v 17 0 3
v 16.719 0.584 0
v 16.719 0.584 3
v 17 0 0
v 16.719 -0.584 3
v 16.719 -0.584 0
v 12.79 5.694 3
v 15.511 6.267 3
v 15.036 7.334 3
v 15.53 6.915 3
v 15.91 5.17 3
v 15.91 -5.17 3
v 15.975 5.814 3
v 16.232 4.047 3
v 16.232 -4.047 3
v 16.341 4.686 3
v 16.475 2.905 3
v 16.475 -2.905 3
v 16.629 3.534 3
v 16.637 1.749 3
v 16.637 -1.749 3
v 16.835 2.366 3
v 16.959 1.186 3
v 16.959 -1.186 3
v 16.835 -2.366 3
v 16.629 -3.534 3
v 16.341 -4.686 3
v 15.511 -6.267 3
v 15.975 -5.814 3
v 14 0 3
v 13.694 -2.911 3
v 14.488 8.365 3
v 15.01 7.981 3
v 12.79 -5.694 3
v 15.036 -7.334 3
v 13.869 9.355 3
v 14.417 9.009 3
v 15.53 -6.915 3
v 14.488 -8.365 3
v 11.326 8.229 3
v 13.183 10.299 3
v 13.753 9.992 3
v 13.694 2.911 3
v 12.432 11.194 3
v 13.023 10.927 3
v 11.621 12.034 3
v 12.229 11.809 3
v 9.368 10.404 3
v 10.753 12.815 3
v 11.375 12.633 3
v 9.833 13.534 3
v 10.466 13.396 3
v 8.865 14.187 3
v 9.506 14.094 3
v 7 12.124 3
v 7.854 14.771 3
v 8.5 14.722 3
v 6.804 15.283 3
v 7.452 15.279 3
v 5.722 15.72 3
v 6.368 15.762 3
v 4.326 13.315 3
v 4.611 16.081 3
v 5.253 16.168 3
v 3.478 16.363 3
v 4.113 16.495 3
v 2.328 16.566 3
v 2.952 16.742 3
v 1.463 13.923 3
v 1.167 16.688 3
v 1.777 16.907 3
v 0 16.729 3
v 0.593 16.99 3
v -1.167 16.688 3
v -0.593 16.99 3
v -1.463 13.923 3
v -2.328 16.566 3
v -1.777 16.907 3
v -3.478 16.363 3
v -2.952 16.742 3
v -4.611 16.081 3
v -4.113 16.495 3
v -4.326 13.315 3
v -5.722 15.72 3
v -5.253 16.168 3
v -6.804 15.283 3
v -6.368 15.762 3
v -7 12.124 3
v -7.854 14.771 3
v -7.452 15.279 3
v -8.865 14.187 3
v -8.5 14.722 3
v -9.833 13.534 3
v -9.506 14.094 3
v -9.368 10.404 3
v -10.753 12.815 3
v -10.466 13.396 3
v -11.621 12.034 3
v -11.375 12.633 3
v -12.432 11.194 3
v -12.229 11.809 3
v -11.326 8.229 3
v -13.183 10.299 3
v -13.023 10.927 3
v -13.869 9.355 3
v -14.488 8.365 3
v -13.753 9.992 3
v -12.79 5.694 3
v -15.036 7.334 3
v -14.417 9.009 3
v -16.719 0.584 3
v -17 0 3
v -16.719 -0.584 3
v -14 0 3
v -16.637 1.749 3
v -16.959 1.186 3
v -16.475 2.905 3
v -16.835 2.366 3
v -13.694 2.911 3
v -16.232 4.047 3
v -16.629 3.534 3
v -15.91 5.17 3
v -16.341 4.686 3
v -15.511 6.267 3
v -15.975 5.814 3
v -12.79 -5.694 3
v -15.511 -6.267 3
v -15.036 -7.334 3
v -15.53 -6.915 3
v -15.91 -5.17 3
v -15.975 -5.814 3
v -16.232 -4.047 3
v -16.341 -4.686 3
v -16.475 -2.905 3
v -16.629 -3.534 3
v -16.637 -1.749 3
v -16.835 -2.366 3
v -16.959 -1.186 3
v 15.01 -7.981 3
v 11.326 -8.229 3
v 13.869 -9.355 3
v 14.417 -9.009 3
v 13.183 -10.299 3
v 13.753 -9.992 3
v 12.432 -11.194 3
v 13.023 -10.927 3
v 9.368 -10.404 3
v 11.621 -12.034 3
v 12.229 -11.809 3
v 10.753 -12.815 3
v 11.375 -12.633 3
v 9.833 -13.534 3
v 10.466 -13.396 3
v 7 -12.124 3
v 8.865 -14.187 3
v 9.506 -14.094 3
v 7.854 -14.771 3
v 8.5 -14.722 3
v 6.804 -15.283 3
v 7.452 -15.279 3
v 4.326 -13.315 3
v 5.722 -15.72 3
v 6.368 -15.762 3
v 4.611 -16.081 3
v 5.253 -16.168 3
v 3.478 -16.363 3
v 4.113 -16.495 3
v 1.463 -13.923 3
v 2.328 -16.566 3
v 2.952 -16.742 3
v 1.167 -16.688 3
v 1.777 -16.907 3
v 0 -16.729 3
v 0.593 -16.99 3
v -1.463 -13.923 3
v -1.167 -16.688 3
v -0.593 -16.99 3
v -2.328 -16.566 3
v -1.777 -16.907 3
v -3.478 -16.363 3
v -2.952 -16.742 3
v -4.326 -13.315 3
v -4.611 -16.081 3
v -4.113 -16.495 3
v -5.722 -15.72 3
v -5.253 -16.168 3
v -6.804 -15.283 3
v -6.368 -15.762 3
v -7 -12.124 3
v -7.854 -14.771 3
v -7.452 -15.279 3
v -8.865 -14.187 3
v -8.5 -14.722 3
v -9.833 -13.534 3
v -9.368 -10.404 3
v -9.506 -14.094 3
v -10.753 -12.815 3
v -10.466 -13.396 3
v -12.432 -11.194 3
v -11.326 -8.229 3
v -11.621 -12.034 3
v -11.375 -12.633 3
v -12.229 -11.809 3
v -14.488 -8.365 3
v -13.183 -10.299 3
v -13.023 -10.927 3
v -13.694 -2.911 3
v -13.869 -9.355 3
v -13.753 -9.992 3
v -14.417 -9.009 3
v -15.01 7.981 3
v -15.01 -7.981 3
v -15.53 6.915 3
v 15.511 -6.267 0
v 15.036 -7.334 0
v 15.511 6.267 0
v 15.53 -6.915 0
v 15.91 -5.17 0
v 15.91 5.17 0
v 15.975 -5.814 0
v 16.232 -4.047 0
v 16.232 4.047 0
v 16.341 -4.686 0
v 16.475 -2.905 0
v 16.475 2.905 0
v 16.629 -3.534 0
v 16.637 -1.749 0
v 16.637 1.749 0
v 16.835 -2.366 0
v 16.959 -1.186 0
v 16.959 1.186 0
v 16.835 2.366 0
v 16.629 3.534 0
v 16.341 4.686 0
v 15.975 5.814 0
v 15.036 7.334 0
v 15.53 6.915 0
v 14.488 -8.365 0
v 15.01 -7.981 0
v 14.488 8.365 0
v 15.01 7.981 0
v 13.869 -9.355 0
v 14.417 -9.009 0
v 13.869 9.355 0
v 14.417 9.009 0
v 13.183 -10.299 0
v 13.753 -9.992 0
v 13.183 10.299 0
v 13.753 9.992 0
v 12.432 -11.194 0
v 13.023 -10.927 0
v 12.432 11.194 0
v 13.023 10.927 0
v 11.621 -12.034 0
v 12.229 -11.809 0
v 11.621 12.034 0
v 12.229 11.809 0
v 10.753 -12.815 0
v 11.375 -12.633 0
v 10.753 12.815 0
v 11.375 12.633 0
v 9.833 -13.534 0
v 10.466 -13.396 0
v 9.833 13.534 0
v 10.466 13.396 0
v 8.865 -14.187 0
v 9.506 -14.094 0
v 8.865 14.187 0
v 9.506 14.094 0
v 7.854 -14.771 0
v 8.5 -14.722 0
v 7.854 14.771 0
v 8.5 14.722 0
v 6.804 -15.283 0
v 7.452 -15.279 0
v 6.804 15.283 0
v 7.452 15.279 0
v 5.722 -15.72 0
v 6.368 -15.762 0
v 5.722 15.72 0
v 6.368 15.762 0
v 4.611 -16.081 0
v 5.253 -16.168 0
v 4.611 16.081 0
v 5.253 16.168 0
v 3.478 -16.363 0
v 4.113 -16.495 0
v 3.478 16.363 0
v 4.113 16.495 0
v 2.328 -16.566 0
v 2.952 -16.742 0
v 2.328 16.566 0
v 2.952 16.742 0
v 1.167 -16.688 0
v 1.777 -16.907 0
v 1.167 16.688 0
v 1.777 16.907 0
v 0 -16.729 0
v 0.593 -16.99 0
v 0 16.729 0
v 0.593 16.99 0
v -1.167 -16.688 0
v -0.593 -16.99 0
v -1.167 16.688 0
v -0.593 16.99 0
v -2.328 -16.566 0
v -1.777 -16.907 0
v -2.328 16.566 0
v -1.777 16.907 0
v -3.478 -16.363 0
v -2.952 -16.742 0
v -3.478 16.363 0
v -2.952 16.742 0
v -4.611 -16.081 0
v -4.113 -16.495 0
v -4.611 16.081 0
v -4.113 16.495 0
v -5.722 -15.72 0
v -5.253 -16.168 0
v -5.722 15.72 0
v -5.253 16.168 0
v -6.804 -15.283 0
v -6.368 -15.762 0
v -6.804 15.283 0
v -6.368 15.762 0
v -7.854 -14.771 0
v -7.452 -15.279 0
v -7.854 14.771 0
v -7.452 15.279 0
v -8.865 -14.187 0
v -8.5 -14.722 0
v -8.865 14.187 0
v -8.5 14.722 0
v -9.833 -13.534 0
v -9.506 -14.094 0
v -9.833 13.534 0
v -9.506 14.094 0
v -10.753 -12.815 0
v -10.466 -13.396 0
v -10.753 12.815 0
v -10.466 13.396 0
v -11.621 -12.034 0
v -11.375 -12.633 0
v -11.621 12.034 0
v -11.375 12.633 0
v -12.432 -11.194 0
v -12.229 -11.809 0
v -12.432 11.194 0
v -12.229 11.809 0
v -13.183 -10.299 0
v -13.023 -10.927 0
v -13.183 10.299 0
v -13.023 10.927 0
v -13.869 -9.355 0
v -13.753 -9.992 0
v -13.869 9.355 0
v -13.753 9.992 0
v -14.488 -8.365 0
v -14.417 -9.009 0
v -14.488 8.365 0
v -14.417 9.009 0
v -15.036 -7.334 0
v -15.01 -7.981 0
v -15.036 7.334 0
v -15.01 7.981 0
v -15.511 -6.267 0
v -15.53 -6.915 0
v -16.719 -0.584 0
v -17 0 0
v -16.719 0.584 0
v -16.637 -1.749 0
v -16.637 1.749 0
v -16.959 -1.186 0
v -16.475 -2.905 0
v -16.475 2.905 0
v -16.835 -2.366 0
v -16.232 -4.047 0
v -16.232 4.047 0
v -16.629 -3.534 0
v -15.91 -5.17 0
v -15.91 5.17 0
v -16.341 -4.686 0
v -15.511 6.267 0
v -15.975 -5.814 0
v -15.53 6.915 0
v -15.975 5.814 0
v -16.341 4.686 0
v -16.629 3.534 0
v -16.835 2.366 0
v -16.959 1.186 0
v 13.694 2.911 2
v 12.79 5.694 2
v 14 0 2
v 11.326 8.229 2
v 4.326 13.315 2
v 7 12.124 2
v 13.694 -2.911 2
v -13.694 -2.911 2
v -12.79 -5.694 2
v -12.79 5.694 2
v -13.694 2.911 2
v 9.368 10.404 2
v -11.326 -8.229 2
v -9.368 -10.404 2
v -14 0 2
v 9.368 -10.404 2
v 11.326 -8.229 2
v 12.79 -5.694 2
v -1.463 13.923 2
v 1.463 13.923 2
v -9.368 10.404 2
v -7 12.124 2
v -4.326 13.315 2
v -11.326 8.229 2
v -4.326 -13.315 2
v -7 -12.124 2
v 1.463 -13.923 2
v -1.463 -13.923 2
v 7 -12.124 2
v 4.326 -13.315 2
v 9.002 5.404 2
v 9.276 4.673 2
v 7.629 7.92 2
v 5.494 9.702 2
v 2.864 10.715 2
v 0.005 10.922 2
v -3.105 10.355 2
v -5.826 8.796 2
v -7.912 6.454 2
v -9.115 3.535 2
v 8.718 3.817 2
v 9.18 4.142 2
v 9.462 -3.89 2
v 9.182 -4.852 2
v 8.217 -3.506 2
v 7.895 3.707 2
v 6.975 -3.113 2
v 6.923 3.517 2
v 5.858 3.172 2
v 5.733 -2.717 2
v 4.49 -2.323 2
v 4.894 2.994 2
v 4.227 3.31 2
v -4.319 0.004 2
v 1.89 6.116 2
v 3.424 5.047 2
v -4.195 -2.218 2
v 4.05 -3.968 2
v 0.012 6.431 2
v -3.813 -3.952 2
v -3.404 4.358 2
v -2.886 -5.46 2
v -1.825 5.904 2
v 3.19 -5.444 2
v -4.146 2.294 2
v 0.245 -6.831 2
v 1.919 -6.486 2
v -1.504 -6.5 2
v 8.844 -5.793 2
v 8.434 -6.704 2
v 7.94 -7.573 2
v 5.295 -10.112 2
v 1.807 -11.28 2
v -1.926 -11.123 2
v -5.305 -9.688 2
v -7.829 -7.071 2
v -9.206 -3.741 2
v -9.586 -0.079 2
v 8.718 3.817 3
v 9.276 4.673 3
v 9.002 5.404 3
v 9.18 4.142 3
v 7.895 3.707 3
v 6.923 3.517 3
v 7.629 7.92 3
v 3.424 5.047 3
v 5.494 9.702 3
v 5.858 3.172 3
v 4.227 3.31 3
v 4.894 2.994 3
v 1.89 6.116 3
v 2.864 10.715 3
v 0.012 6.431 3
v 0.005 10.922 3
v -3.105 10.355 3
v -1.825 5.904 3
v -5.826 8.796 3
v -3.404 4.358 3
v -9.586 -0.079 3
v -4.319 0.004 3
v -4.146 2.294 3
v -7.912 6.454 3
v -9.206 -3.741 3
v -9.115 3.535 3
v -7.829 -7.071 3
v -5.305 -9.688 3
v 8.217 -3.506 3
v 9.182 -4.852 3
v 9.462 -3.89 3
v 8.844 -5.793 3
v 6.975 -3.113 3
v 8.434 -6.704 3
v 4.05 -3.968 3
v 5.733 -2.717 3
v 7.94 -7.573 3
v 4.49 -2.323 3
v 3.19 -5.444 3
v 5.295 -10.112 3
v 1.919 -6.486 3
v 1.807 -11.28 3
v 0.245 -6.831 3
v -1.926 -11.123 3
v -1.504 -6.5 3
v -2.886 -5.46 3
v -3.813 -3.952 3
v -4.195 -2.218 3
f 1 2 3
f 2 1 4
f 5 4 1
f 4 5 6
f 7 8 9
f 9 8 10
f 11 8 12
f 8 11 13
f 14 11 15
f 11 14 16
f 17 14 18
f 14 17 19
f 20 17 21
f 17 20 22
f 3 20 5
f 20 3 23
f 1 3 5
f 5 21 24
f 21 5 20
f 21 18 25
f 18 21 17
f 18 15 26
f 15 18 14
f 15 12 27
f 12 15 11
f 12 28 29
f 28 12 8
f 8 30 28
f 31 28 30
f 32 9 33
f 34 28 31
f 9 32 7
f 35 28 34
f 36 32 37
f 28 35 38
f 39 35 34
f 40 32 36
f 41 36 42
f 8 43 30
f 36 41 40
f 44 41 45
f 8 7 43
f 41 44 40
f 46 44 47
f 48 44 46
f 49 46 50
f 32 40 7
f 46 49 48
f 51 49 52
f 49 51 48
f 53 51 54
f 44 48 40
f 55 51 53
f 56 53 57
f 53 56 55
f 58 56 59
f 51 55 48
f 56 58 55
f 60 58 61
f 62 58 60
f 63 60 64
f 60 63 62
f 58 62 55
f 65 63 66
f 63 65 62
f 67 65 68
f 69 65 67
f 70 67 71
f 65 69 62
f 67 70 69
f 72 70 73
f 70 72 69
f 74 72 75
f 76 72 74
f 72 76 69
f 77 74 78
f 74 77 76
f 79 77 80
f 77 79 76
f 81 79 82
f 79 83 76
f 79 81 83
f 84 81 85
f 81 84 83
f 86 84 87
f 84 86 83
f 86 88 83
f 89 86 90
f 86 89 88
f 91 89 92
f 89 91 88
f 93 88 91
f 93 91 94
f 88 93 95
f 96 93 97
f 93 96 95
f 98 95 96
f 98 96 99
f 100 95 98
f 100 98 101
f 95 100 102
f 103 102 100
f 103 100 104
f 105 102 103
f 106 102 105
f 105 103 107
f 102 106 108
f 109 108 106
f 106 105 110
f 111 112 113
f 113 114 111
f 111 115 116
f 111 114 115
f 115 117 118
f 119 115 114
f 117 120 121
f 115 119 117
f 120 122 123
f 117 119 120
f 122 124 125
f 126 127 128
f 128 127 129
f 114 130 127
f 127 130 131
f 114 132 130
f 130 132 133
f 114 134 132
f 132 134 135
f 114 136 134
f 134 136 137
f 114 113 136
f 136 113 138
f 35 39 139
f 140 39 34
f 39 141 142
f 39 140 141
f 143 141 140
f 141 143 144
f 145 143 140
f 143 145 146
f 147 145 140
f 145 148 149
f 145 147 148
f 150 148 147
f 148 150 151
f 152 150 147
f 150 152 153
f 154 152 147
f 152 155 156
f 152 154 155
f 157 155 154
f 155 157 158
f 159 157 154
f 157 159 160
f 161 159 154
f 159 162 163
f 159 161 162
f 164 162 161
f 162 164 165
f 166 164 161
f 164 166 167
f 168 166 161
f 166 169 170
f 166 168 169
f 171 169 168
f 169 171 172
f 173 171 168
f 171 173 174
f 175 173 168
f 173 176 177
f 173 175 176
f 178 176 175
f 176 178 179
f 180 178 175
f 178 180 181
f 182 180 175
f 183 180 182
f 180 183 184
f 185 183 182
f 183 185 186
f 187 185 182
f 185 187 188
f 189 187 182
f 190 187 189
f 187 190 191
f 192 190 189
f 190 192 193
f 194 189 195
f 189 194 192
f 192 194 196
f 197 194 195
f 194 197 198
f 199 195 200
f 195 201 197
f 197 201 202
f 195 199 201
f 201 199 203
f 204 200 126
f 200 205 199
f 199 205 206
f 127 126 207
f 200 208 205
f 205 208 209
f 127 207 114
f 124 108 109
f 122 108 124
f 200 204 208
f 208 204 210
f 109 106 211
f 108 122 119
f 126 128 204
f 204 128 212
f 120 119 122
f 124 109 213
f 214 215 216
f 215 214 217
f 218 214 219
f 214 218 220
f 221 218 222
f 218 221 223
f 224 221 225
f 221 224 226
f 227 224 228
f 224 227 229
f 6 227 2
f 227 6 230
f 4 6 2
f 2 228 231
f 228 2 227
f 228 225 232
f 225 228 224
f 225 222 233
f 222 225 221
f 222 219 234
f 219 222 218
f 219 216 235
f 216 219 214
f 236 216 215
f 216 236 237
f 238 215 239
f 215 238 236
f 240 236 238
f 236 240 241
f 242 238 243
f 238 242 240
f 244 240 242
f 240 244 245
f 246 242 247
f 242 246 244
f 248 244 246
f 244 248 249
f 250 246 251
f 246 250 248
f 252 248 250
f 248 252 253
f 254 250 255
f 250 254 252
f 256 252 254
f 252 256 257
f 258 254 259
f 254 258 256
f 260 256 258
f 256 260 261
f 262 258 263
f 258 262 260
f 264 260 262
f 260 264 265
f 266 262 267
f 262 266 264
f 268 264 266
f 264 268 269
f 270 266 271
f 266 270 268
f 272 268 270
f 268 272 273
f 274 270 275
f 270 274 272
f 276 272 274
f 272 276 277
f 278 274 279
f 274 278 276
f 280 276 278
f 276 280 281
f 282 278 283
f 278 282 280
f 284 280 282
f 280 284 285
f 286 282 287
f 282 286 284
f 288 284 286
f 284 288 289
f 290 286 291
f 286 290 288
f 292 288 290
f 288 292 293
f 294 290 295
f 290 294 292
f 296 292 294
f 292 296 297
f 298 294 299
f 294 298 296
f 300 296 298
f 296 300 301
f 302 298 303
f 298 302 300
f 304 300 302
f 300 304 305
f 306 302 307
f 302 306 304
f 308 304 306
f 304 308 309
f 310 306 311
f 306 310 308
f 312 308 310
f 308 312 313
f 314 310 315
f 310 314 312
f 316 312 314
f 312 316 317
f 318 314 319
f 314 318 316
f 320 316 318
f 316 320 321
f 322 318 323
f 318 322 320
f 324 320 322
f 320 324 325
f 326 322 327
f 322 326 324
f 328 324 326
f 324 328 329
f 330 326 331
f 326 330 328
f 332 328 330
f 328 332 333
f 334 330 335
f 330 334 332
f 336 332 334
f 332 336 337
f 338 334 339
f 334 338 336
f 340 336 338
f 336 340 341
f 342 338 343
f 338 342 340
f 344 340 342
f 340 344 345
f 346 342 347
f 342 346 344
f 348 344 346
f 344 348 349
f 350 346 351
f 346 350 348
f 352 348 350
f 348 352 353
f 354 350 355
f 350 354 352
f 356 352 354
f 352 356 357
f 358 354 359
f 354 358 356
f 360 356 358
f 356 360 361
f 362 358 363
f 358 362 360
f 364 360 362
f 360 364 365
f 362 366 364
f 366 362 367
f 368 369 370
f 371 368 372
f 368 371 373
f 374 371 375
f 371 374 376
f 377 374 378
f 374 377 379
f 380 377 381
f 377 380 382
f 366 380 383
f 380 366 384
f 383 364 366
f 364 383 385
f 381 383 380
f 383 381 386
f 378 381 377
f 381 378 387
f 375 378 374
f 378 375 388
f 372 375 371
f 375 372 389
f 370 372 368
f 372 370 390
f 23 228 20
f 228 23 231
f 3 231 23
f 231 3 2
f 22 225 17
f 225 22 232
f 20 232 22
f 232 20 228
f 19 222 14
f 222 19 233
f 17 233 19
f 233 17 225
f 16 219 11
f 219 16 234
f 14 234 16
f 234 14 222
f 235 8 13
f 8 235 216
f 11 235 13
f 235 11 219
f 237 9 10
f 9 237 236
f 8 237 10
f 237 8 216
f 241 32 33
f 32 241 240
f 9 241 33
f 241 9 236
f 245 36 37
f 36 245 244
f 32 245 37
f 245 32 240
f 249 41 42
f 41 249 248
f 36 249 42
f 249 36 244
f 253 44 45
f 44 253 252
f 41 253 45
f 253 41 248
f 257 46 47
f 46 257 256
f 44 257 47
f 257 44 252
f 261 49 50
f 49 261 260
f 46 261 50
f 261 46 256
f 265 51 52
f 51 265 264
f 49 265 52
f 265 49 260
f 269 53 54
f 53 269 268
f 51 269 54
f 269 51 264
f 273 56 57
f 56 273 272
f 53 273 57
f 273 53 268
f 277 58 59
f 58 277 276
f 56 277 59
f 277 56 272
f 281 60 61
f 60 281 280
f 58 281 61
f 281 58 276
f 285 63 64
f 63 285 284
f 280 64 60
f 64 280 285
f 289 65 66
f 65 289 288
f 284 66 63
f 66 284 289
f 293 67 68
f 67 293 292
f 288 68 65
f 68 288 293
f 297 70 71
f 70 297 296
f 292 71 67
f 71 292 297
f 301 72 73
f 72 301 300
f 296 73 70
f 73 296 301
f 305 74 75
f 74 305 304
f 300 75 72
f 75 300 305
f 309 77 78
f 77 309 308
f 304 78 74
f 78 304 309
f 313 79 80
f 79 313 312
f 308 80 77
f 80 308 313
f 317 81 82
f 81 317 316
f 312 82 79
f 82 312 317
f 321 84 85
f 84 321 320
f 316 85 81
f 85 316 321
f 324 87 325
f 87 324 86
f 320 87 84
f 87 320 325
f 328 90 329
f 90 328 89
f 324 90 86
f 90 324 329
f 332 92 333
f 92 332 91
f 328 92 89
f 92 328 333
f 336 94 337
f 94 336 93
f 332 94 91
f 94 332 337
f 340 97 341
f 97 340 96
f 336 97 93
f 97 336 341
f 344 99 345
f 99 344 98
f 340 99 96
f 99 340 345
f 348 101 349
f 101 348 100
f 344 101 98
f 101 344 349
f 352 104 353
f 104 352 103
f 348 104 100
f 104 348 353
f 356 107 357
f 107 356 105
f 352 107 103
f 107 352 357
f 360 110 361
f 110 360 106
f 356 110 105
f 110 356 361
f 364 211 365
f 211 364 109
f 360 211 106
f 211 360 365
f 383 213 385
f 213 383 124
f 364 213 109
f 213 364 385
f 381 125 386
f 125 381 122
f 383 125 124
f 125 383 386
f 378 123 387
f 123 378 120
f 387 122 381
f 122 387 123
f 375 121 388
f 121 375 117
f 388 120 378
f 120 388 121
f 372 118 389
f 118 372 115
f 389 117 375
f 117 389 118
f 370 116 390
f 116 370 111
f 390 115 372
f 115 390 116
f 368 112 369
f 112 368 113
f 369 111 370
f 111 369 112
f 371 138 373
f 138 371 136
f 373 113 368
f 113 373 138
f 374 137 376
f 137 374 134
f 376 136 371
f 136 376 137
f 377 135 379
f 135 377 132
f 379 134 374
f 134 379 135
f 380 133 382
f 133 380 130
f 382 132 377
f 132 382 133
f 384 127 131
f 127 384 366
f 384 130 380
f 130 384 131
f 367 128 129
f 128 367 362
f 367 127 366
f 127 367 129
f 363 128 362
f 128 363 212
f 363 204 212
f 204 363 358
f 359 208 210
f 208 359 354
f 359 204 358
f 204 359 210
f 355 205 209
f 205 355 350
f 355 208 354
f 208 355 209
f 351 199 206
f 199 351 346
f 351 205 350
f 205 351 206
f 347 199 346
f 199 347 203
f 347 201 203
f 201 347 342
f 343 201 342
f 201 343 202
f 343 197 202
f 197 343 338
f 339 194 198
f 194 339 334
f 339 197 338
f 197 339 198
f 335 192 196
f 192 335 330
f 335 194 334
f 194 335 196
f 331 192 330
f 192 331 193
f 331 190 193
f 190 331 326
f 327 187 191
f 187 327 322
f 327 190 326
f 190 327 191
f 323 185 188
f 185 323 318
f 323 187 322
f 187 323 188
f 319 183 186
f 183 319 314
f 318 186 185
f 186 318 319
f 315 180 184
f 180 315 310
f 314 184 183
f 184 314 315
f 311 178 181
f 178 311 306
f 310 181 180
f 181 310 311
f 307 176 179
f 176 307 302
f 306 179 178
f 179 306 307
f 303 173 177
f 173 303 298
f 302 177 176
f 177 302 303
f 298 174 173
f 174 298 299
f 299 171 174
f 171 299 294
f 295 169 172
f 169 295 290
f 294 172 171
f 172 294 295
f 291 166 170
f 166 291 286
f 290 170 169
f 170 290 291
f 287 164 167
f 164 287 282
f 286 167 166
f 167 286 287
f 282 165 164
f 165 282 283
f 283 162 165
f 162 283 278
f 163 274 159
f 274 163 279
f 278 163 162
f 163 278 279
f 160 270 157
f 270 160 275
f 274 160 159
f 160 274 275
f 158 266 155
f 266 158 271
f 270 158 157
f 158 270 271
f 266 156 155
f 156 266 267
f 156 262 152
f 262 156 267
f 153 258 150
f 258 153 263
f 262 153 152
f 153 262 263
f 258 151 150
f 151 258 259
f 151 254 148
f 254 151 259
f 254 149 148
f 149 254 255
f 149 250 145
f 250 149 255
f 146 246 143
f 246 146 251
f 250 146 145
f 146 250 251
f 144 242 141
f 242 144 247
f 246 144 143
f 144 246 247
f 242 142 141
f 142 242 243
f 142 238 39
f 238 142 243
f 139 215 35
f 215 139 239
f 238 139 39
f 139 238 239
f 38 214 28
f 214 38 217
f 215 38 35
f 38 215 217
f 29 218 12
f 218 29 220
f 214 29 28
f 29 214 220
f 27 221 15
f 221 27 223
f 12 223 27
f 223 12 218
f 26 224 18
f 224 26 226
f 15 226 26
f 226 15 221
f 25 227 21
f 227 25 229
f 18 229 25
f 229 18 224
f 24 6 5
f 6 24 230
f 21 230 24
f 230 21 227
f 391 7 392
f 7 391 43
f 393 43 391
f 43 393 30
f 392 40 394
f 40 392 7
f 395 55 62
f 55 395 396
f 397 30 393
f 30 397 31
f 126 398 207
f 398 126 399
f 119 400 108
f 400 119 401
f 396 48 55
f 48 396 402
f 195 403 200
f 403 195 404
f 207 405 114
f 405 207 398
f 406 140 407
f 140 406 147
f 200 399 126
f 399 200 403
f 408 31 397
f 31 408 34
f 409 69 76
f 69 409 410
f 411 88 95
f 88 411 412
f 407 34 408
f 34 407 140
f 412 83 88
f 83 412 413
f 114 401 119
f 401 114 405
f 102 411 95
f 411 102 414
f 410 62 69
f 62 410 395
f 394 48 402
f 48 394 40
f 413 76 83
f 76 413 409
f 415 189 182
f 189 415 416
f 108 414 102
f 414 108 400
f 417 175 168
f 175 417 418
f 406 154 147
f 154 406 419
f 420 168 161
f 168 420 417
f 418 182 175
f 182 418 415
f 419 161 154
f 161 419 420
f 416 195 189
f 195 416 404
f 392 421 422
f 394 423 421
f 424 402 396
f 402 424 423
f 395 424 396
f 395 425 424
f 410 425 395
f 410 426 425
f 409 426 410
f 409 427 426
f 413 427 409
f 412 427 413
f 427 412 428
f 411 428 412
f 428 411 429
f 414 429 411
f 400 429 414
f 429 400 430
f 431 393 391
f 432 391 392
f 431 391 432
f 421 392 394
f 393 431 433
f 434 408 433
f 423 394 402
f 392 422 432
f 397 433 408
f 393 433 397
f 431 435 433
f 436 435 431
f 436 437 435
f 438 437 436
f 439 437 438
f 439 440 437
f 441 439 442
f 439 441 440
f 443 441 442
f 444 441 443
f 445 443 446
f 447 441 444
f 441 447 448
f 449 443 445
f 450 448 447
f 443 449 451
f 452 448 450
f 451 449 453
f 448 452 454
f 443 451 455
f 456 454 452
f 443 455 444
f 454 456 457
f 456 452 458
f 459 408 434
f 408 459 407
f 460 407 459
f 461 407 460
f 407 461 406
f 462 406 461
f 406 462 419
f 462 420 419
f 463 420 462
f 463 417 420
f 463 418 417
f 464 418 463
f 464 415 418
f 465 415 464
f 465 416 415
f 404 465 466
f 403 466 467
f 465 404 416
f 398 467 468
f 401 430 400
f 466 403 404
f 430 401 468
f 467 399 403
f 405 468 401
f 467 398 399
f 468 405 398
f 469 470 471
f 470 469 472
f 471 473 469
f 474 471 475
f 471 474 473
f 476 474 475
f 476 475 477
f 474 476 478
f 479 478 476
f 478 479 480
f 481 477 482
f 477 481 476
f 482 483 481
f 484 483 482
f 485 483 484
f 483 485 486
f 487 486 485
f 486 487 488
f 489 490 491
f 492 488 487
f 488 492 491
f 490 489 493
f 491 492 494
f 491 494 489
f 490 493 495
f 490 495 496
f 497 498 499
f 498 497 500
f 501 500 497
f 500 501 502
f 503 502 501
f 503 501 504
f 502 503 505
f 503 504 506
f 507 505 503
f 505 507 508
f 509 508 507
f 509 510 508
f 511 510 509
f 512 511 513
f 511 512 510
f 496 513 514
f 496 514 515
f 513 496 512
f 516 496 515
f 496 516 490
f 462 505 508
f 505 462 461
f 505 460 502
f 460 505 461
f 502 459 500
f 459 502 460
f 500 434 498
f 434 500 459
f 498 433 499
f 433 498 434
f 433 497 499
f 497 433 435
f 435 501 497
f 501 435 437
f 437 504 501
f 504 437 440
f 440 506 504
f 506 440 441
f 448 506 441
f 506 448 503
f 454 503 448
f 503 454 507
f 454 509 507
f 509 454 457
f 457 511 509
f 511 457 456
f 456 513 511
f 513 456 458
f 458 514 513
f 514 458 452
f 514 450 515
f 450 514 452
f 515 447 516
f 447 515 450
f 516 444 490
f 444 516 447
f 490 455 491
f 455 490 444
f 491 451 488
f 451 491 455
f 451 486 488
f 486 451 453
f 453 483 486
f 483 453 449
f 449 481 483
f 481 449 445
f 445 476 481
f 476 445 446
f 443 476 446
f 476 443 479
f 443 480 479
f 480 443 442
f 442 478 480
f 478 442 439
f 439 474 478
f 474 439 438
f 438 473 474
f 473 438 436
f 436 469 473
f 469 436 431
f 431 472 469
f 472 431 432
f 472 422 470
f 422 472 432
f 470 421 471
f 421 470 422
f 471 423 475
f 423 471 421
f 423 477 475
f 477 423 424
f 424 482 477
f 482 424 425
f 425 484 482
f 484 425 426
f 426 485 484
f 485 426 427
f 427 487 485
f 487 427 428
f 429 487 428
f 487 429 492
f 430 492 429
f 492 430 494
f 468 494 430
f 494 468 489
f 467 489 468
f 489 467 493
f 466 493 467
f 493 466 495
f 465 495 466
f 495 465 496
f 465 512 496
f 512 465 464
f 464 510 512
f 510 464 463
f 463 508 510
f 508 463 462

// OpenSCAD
// file: coin-lib.scad
/*
 * Simple coin shape
 *
 * Copyright (c) 2012 Mark Hindess
 *
 * Creative Commons Attribution-NonCommercial-ShareAlike 3.0 Unported License:
 *
 *   http://creativecommons.org/licenses/by-nc-sa/3.0/
 */

module coin(height = 3, radius = 17,
            cut_radius = 14, cut_height = 1,
            bumps = 90, bump_radius = 2) {
  deg = 360/bumps;
  difference() {
    union() {
      for(n=[0:bumps-1]) {
        rotate([0, 0, n*deg])
          translate([radius-bump_radius, 0, 0])
            cylinder(r = bump_radius, h = height);
      }
      cylinder(r = radius-bump_radius, h = height);
    }
    translate([0, 0, height-cut_height])
      cylinder(r = cut_radius, h = height-cut_height);
  }
}

coin();
// main file
use <coin-lib.scad>
coin();
translate([-13,-13,2])
  scale([0.3,0.3,1])
    linear_extrude(file = "c.dxf", height = 2, center = true);
